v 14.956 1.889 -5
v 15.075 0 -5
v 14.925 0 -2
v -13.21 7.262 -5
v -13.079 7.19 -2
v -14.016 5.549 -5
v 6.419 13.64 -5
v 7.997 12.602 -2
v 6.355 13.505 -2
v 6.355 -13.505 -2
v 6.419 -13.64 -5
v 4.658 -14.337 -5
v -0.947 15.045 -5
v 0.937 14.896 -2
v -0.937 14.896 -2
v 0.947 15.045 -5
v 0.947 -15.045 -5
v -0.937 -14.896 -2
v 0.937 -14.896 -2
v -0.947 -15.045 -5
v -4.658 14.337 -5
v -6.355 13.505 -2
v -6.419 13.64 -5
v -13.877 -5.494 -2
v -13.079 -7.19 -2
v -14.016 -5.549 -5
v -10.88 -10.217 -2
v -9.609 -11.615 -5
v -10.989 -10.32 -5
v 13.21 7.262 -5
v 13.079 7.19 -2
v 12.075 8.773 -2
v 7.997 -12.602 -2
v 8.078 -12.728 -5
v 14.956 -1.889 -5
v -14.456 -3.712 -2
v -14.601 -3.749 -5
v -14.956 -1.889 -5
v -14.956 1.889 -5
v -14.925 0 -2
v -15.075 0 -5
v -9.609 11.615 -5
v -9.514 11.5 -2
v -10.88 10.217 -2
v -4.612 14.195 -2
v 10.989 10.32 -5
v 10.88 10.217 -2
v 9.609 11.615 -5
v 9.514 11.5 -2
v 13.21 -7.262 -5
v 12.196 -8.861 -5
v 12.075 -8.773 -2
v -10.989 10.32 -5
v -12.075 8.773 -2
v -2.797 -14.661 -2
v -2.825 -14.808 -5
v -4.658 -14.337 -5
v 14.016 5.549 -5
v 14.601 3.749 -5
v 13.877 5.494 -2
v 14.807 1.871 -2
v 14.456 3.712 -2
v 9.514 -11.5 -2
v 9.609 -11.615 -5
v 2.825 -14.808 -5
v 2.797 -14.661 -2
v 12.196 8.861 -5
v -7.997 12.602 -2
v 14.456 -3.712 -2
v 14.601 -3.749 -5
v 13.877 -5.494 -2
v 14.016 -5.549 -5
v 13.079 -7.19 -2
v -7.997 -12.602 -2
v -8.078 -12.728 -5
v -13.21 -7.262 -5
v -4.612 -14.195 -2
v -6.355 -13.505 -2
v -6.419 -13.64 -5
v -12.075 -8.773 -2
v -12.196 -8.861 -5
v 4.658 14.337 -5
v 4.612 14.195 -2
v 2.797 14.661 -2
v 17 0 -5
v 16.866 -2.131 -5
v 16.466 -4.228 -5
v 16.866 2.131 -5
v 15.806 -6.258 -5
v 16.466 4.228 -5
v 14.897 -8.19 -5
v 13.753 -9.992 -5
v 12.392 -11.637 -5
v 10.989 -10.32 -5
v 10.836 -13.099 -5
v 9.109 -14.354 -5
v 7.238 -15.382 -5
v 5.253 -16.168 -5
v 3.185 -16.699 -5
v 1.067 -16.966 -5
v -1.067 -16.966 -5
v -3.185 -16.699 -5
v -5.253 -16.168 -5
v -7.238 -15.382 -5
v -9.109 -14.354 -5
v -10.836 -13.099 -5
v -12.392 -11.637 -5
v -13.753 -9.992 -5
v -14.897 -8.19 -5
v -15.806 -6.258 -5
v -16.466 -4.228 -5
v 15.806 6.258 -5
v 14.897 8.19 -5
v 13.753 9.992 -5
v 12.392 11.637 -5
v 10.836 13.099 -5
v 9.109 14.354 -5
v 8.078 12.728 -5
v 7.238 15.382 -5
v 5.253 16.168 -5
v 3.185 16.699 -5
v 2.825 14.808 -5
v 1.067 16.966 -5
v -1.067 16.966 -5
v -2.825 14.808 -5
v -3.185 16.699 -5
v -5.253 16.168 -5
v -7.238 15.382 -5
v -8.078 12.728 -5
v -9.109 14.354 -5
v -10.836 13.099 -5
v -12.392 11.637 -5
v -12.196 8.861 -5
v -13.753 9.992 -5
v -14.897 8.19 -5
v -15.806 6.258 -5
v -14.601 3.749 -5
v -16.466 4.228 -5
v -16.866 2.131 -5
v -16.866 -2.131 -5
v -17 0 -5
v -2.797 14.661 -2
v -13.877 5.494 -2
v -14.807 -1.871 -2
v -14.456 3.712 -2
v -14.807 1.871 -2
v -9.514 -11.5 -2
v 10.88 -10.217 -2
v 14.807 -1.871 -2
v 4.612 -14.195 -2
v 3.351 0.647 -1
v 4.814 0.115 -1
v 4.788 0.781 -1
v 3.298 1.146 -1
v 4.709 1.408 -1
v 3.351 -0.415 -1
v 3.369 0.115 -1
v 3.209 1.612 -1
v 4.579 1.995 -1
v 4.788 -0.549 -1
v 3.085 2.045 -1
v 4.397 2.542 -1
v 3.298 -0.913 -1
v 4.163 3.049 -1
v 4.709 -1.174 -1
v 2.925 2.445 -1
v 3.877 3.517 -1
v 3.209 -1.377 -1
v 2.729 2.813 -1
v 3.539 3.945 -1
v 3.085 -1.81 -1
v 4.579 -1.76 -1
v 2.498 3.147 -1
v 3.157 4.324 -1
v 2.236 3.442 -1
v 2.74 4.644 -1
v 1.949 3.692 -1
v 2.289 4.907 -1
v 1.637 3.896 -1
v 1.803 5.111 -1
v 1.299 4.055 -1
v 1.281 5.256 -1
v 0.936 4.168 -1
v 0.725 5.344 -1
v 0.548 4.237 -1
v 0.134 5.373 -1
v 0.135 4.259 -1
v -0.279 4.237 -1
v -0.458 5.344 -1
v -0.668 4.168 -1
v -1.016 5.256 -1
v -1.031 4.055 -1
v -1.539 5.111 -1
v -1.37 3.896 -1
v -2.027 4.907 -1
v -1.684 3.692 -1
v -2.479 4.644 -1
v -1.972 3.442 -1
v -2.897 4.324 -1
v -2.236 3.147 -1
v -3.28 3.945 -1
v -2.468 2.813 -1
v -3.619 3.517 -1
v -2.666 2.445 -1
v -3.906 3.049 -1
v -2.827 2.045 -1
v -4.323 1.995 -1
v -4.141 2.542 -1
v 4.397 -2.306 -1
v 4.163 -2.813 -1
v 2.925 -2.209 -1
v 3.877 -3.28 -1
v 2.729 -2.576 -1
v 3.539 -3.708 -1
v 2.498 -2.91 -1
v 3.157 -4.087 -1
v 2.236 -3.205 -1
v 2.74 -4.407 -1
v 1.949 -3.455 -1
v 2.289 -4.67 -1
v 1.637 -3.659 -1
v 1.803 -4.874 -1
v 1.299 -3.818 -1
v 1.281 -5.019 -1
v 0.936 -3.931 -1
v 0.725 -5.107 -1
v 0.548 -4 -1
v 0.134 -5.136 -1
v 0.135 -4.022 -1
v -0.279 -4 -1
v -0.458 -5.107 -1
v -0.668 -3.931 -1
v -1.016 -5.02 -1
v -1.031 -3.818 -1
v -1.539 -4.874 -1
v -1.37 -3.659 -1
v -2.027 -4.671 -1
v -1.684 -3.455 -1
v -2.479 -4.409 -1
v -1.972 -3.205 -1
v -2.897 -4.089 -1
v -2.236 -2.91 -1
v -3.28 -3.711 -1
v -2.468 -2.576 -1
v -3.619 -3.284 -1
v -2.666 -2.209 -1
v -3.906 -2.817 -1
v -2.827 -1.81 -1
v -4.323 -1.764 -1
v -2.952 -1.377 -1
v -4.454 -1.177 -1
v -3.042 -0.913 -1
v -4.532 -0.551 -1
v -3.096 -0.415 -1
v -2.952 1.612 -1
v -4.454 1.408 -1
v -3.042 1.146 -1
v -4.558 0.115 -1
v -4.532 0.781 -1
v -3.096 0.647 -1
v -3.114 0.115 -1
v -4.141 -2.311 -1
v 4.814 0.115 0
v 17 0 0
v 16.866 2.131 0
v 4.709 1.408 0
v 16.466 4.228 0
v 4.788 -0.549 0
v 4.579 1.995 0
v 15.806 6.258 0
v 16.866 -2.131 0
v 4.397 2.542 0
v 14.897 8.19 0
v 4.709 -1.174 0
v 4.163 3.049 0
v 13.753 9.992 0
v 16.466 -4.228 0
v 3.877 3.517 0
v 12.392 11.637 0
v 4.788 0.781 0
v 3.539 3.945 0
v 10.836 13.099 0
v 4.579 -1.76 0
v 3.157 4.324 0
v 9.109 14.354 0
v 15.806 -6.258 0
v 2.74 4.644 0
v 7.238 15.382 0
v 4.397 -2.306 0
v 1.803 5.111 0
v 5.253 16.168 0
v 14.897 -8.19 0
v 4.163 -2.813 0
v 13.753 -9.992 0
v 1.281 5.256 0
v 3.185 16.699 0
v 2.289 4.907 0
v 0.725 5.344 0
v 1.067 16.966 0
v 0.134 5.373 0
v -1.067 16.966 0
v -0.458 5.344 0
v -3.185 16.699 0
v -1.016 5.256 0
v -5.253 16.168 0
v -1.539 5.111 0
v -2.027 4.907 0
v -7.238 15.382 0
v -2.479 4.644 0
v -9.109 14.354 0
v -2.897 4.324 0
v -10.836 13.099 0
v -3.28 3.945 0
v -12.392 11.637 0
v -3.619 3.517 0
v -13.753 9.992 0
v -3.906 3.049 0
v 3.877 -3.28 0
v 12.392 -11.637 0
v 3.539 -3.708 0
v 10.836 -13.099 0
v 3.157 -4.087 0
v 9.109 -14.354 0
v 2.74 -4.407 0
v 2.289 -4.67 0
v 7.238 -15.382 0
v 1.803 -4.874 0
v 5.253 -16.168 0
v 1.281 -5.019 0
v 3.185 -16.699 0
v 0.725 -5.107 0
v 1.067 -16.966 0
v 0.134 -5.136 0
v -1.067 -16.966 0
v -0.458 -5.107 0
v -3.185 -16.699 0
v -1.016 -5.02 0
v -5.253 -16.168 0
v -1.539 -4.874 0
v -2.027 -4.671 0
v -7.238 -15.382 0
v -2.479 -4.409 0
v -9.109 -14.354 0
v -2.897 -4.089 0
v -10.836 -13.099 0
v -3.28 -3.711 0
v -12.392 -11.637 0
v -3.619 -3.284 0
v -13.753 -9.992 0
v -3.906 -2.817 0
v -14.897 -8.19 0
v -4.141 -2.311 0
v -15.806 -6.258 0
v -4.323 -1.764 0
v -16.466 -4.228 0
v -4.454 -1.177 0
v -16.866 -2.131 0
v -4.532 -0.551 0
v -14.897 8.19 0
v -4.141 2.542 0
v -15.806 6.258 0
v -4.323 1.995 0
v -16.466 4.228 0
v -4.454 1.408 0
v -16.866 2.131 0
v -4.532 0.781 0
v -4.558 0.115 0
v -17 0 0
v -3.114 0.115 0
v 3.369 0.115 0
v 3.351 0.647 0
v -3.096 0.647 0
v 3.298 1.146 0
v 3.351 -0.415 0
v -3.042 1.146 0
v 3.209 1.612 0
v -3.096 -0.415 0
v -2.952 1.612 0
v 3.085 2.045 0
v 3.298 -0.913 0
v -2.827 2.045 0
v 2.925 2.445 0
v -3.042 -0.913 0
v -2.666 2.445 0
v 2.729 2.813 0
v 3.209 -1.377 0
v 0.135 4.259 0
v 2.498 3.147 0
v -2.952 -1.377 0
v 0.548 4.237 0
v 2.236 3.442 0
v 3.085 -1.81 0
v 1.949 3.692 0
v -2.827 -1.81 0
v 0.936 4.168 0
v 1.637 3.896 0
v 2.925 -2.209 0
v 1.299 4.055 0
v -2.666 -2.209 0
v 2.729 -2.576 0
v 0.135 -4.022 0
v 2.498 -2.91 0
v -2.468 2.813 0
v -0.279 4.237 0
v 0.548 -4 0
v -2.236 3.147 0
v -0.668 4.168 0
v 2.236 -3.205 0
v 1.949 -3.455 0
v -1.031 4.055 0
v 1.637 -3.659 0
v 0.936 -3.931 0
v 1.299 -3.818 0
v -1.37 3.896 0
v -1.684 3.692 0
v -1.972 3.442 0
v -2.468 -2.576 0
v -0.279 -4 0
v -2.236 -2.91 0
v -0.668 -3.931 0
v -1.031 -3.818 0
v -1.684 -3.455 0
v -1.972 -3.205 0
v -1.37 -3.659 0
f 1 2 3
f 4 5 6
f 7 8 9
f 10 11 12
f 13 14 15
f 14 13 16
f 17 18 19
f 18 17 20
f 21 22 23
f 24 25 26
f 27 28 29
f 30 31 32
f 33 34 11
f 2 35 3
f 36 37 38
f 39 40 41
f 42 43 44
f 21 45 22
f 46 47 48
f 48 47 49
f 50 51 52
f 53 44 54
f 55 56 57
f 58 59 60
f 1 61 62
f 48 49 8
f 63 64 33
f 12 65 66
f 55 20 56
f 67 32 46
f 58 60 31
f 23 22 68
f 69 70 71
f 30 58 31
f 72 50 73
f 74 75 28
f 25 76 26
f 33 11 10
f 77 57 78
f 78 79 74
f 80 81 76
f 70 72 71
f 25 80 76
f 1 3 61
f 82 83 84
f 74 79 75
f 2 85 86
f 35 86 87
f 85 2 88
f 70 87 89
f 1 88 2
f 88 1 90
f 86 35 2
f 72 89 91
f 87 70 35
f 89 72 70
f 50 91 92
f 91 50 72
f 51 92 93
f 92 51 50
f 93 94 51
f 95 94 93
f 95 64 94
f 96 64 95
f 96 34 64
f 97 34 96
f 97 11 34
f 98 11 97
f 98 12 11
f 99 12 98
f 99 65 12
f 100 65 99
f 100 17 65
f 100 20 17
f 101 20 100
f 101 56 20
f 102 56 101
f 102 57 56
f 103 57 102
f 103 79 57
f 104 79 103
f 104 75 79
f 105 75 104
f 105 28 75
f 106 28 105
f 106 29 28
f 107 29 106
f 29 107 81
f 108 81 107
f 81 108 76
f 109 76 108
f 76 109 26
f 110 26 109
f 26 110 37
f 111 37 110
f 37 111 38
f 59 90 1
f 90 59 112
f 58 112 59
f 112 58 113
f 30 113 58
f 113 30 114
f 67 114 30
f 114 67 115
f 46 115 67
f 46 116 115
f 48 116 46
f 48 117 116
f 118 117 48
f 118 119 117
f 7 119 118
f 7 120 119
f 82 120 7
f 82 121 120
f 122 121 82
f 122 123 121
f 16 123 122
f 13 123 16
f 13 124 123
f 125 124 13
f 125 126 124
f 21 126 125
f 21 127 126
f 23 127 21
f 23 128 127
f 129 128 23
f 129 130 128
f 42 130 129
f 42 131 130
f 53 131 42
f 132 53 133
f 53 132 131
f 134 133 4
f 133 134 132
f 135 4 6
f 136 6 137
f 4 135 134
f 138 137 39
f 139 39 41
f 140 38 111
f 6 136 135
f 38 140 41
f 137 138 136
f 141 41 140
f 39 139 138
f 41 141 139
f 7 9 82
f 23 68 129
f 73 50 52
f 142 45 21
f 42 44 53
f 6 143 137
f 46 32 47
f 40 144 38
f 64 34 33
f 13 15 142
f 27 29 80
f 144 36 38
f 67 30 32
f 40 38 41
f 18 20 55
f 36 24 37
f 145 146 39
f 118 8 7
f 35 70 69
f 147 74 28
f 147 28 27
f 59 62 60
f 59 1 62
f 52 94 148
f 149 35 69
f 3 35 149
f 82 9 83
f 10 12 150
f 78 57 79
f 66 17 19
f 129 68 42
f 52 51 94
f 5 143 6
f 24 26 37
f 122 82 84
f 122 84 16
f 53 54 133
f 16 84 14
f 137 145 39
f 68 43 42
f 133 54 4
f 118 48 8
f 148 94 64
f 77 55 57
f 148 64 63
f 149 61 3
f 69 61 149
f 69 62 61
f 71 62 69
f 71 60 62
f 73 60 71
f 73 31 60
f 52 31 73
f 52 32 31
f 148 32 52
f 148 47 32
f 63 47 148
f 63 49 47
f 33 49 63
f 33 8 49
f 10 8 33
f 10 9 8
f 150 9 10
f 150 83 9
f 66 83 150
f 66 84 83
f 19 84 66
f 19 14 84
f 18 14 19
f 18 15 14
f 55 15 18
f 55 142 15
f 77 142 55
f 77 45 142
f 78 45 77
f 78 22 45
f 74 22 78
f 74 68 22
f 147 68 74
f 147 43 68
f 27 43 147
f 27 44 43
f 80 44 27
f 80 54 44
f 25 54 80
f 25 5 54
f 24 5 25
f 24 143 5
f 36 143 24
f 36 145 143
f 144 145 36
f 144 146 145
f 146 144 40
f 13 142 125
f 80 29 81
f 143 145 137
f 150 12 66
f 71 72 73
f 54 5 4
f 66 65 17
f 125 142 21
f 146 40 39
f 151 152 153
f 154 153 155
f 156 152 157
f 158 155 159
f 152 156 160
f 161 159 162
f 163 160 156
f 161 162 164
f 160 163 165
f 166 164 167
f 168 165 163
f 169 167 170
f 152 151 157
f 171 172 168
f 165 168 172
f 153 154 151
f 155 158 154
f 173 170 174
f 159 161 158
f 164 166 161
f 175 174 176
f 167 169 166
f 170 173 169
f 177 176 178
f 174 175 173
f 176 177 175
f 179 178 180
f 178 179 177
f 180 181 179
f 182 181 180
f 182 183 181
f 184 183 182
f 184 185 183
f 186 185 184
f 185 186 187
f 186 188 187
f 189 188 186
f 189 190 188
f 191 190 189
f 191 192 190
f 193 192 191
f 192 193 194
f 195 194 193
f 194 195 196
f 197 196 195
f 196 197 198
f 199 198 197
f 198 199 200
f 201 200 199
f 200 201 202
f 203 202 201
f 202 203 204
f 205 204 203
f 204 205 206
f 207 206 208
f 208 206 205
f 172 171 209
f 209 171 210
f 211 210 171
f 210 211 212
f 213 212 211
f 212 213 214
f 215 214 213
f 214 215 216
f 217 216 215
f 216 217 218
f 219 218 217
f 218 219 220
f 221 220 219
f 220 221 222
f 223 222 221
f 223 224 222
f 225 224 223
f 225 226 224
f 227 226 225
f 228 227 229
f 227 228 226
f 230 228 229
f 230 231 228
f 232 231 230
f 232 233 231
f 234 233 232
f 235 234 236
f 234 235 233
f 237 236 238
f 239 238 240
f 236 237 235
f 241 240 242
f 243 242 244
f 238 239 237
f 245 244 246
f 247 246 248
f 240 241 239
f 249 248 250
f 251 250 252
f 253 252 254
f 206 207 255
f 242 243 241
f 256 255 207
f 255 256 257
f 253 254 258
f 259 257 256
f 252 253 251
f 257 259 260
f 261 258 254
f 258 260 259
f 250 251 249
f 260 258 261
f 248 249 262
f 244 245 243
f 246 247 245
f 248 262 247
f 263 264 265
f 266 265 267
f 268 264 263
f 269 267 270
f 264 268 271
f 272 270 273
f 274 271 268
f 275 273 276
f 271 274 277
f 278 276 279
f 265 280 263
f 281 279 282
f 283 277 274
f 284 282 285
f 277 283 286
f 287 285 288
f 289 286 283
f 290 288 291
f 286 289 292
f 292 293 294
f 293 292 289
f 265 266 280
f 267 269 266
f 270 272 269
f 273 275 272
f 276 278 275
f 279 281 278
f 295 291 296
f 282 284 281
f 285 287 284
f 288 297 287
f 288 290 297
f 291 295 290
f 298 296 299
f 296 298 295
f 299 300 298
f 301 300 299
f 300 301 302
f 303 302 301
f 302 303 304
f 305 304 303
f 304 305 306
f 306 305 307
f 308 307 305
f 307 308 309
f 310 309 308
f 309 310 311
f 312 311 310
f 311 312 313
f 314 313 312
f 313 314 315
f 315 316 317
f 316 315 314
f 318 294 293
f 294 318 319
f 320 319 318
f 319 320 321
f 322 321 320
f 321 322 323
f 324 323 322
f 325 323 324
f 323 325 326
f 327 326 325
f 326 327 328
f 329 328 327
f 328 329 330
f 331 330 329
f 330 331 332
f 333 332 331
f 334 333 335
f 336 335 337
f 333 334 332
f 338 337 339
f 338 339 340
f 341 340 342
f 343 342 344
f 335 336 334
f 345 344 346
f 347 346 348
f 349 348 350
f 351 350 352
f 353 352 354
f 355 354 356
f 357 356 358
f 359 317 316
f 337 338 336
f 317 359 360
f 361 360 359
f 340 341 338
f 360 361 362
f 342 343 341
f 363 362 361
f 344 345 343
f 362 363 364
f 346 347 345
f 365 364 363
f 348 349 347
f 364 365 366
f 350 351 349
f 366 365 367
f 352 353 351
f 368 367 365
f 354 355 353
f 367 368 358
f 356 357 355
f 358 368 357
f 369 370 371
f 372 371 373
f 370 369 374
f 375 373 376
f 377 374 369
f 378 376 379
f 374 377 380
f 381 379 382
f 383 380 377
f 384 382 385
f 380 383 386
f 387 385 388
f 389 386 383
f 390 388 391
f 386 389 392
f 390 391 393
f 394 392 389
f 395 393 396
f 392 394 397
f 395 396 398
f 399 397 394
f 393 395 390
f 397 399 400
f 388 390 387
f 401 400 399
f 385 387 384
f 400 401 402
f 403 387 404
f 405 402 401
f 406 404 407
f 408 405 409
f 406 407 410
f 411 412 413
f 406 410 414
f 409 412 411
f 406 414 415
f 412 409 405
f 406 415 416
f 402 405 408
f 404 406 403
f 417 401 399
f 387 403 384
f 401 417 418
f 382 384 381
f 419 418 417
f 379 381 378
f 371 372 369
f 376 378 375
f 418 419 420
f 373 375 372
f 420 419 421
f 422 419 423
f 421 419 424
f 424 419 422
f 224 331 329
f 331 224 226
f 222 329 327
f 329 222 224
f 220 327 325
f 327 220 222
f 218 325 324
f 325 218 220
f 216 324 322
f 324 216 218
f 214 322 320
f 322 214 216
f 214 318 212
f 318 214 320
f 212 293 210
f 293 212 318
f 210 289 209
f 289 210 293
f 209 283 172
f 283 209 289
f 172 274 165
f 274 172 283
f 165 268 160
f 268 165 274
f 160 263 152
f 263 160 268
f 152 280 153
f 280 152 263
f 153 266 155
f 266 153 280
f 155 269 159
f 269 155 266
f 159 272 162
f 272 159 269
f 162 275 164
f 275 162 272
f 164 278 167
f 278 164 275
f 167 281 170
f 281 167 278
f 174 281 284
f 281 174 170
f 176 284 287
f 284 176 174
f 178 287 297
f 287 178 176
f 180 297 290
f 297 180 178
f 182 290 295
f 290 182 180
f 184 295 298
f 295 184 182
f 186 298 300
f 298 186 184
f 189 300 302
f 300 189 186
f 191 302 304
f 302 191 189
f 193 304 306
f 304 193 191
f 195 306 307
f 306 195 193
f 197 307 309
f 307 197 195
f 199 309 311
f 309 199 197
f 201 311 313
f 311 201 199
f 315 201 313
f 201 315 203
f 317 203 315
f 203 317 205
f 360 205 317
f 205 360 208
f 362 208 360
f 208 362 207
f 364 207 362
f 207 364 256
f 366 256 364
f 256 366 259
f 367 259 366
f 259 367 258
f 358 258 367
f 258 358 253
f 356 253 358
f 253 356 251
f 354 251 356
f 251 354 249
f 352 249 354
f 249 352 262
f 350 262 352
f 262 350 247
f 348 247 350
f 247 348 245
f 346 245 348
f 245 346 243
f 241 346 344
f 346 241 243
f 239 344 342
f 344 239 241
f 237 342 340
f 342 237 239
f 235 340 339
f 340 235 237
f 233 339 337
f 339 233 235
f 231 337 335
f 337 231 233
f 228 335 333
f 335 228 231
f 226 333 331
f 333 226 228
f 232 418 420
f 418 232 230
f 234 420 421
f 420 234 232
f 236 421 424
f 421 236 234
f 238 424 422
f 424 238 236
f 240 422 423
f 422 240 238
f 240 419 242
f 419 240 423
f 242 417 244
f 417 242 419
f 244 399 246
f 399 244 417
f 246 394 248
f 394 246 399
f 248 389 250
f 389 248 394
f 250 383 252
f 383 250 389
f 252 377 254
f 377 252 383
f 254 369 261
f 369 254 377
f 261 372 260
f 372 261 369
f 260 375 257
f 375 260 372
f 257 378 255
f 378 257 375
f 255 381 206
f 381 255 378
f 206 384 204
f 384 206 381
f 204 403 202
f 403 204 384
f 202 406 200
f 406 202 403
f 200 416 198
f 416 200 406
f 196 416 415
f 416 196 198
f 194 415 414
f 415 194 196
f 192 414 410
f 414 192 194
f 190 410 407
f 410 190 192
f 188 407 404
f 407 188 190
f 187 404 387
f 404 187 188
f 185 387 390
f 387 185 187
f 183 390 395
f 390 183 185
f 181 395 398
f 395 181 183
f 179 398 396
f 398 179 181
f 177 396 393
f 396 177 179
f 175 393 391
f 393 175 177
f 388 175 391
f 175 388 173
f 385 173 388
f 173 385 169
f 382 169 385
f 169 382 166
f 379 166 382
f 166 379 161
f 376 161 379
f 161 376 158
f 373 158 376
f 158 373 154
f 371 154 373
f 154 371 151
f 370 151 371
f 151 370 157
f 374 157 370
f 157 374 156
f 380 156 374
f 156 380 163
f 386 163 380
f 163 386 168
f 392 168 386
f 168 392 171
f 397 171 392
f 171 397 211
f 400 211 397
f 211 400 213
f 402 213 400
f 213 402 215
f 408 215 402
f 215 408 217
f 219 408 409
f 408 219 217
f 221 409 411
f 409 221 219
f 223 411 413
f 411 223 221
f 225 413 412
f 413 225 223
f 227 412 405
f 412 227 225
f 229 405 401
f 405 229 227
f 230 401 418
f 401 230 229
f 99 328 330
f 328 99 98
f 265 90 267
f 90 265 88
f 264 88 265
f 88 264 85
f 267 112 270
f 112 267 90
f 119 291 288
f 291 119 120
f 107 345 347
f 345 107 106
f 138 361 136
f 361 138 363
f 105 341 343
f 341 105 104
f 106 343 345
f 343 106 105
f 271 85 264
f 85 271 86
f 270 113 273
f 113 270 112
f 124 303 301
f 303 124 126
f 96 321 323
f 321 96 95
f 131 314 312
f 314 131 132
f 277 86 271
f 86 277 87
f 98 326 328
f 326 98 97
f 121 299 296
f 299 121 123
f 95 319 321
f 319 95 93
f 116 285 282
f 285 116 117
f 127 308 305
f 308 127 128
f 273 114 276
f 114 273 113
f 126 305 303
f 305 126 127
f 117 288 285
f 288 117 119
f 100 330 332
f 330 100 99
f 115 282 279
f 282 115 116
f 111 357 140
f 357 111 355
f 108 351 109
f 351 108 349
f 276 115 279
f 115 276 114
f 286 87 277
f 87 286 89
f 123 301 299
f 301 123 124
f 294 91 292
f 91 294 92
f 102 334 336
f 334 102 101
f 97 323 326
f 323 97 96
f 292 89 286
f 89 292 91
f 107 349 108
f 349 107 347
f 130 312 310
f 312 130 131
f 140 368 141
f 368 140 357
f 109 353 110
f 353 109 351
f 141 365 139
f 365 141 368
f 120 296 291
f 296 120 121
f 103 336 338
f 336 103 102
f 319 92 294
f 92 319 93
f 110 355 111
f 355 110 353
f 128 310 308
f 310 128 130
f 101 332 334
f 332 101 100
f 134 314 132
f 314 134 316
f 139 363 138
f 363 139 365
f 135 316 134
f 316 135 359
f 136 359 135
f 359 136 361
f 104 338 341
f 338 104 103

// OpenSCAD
$fn = 50;


difference() {
	union() {
		translate(v = [0, 0, -5.0000000000]) {
			cylinder(h = 5, r = 17.0000000000);
		}
	}
	union() {
		#translate(v = [0, 0, -5.0000000000]) {
			cylinder(h = 3, r1 = 15.0750000000, r2 = 14.9250000000);
		}
		translate(v = [0, 0, -1]) {
			linear_extrude(height = 1) {
				text(font = "Impact", halign = "center", size = 10, text = "O", valign = "center");
			}
		}
	}
}
